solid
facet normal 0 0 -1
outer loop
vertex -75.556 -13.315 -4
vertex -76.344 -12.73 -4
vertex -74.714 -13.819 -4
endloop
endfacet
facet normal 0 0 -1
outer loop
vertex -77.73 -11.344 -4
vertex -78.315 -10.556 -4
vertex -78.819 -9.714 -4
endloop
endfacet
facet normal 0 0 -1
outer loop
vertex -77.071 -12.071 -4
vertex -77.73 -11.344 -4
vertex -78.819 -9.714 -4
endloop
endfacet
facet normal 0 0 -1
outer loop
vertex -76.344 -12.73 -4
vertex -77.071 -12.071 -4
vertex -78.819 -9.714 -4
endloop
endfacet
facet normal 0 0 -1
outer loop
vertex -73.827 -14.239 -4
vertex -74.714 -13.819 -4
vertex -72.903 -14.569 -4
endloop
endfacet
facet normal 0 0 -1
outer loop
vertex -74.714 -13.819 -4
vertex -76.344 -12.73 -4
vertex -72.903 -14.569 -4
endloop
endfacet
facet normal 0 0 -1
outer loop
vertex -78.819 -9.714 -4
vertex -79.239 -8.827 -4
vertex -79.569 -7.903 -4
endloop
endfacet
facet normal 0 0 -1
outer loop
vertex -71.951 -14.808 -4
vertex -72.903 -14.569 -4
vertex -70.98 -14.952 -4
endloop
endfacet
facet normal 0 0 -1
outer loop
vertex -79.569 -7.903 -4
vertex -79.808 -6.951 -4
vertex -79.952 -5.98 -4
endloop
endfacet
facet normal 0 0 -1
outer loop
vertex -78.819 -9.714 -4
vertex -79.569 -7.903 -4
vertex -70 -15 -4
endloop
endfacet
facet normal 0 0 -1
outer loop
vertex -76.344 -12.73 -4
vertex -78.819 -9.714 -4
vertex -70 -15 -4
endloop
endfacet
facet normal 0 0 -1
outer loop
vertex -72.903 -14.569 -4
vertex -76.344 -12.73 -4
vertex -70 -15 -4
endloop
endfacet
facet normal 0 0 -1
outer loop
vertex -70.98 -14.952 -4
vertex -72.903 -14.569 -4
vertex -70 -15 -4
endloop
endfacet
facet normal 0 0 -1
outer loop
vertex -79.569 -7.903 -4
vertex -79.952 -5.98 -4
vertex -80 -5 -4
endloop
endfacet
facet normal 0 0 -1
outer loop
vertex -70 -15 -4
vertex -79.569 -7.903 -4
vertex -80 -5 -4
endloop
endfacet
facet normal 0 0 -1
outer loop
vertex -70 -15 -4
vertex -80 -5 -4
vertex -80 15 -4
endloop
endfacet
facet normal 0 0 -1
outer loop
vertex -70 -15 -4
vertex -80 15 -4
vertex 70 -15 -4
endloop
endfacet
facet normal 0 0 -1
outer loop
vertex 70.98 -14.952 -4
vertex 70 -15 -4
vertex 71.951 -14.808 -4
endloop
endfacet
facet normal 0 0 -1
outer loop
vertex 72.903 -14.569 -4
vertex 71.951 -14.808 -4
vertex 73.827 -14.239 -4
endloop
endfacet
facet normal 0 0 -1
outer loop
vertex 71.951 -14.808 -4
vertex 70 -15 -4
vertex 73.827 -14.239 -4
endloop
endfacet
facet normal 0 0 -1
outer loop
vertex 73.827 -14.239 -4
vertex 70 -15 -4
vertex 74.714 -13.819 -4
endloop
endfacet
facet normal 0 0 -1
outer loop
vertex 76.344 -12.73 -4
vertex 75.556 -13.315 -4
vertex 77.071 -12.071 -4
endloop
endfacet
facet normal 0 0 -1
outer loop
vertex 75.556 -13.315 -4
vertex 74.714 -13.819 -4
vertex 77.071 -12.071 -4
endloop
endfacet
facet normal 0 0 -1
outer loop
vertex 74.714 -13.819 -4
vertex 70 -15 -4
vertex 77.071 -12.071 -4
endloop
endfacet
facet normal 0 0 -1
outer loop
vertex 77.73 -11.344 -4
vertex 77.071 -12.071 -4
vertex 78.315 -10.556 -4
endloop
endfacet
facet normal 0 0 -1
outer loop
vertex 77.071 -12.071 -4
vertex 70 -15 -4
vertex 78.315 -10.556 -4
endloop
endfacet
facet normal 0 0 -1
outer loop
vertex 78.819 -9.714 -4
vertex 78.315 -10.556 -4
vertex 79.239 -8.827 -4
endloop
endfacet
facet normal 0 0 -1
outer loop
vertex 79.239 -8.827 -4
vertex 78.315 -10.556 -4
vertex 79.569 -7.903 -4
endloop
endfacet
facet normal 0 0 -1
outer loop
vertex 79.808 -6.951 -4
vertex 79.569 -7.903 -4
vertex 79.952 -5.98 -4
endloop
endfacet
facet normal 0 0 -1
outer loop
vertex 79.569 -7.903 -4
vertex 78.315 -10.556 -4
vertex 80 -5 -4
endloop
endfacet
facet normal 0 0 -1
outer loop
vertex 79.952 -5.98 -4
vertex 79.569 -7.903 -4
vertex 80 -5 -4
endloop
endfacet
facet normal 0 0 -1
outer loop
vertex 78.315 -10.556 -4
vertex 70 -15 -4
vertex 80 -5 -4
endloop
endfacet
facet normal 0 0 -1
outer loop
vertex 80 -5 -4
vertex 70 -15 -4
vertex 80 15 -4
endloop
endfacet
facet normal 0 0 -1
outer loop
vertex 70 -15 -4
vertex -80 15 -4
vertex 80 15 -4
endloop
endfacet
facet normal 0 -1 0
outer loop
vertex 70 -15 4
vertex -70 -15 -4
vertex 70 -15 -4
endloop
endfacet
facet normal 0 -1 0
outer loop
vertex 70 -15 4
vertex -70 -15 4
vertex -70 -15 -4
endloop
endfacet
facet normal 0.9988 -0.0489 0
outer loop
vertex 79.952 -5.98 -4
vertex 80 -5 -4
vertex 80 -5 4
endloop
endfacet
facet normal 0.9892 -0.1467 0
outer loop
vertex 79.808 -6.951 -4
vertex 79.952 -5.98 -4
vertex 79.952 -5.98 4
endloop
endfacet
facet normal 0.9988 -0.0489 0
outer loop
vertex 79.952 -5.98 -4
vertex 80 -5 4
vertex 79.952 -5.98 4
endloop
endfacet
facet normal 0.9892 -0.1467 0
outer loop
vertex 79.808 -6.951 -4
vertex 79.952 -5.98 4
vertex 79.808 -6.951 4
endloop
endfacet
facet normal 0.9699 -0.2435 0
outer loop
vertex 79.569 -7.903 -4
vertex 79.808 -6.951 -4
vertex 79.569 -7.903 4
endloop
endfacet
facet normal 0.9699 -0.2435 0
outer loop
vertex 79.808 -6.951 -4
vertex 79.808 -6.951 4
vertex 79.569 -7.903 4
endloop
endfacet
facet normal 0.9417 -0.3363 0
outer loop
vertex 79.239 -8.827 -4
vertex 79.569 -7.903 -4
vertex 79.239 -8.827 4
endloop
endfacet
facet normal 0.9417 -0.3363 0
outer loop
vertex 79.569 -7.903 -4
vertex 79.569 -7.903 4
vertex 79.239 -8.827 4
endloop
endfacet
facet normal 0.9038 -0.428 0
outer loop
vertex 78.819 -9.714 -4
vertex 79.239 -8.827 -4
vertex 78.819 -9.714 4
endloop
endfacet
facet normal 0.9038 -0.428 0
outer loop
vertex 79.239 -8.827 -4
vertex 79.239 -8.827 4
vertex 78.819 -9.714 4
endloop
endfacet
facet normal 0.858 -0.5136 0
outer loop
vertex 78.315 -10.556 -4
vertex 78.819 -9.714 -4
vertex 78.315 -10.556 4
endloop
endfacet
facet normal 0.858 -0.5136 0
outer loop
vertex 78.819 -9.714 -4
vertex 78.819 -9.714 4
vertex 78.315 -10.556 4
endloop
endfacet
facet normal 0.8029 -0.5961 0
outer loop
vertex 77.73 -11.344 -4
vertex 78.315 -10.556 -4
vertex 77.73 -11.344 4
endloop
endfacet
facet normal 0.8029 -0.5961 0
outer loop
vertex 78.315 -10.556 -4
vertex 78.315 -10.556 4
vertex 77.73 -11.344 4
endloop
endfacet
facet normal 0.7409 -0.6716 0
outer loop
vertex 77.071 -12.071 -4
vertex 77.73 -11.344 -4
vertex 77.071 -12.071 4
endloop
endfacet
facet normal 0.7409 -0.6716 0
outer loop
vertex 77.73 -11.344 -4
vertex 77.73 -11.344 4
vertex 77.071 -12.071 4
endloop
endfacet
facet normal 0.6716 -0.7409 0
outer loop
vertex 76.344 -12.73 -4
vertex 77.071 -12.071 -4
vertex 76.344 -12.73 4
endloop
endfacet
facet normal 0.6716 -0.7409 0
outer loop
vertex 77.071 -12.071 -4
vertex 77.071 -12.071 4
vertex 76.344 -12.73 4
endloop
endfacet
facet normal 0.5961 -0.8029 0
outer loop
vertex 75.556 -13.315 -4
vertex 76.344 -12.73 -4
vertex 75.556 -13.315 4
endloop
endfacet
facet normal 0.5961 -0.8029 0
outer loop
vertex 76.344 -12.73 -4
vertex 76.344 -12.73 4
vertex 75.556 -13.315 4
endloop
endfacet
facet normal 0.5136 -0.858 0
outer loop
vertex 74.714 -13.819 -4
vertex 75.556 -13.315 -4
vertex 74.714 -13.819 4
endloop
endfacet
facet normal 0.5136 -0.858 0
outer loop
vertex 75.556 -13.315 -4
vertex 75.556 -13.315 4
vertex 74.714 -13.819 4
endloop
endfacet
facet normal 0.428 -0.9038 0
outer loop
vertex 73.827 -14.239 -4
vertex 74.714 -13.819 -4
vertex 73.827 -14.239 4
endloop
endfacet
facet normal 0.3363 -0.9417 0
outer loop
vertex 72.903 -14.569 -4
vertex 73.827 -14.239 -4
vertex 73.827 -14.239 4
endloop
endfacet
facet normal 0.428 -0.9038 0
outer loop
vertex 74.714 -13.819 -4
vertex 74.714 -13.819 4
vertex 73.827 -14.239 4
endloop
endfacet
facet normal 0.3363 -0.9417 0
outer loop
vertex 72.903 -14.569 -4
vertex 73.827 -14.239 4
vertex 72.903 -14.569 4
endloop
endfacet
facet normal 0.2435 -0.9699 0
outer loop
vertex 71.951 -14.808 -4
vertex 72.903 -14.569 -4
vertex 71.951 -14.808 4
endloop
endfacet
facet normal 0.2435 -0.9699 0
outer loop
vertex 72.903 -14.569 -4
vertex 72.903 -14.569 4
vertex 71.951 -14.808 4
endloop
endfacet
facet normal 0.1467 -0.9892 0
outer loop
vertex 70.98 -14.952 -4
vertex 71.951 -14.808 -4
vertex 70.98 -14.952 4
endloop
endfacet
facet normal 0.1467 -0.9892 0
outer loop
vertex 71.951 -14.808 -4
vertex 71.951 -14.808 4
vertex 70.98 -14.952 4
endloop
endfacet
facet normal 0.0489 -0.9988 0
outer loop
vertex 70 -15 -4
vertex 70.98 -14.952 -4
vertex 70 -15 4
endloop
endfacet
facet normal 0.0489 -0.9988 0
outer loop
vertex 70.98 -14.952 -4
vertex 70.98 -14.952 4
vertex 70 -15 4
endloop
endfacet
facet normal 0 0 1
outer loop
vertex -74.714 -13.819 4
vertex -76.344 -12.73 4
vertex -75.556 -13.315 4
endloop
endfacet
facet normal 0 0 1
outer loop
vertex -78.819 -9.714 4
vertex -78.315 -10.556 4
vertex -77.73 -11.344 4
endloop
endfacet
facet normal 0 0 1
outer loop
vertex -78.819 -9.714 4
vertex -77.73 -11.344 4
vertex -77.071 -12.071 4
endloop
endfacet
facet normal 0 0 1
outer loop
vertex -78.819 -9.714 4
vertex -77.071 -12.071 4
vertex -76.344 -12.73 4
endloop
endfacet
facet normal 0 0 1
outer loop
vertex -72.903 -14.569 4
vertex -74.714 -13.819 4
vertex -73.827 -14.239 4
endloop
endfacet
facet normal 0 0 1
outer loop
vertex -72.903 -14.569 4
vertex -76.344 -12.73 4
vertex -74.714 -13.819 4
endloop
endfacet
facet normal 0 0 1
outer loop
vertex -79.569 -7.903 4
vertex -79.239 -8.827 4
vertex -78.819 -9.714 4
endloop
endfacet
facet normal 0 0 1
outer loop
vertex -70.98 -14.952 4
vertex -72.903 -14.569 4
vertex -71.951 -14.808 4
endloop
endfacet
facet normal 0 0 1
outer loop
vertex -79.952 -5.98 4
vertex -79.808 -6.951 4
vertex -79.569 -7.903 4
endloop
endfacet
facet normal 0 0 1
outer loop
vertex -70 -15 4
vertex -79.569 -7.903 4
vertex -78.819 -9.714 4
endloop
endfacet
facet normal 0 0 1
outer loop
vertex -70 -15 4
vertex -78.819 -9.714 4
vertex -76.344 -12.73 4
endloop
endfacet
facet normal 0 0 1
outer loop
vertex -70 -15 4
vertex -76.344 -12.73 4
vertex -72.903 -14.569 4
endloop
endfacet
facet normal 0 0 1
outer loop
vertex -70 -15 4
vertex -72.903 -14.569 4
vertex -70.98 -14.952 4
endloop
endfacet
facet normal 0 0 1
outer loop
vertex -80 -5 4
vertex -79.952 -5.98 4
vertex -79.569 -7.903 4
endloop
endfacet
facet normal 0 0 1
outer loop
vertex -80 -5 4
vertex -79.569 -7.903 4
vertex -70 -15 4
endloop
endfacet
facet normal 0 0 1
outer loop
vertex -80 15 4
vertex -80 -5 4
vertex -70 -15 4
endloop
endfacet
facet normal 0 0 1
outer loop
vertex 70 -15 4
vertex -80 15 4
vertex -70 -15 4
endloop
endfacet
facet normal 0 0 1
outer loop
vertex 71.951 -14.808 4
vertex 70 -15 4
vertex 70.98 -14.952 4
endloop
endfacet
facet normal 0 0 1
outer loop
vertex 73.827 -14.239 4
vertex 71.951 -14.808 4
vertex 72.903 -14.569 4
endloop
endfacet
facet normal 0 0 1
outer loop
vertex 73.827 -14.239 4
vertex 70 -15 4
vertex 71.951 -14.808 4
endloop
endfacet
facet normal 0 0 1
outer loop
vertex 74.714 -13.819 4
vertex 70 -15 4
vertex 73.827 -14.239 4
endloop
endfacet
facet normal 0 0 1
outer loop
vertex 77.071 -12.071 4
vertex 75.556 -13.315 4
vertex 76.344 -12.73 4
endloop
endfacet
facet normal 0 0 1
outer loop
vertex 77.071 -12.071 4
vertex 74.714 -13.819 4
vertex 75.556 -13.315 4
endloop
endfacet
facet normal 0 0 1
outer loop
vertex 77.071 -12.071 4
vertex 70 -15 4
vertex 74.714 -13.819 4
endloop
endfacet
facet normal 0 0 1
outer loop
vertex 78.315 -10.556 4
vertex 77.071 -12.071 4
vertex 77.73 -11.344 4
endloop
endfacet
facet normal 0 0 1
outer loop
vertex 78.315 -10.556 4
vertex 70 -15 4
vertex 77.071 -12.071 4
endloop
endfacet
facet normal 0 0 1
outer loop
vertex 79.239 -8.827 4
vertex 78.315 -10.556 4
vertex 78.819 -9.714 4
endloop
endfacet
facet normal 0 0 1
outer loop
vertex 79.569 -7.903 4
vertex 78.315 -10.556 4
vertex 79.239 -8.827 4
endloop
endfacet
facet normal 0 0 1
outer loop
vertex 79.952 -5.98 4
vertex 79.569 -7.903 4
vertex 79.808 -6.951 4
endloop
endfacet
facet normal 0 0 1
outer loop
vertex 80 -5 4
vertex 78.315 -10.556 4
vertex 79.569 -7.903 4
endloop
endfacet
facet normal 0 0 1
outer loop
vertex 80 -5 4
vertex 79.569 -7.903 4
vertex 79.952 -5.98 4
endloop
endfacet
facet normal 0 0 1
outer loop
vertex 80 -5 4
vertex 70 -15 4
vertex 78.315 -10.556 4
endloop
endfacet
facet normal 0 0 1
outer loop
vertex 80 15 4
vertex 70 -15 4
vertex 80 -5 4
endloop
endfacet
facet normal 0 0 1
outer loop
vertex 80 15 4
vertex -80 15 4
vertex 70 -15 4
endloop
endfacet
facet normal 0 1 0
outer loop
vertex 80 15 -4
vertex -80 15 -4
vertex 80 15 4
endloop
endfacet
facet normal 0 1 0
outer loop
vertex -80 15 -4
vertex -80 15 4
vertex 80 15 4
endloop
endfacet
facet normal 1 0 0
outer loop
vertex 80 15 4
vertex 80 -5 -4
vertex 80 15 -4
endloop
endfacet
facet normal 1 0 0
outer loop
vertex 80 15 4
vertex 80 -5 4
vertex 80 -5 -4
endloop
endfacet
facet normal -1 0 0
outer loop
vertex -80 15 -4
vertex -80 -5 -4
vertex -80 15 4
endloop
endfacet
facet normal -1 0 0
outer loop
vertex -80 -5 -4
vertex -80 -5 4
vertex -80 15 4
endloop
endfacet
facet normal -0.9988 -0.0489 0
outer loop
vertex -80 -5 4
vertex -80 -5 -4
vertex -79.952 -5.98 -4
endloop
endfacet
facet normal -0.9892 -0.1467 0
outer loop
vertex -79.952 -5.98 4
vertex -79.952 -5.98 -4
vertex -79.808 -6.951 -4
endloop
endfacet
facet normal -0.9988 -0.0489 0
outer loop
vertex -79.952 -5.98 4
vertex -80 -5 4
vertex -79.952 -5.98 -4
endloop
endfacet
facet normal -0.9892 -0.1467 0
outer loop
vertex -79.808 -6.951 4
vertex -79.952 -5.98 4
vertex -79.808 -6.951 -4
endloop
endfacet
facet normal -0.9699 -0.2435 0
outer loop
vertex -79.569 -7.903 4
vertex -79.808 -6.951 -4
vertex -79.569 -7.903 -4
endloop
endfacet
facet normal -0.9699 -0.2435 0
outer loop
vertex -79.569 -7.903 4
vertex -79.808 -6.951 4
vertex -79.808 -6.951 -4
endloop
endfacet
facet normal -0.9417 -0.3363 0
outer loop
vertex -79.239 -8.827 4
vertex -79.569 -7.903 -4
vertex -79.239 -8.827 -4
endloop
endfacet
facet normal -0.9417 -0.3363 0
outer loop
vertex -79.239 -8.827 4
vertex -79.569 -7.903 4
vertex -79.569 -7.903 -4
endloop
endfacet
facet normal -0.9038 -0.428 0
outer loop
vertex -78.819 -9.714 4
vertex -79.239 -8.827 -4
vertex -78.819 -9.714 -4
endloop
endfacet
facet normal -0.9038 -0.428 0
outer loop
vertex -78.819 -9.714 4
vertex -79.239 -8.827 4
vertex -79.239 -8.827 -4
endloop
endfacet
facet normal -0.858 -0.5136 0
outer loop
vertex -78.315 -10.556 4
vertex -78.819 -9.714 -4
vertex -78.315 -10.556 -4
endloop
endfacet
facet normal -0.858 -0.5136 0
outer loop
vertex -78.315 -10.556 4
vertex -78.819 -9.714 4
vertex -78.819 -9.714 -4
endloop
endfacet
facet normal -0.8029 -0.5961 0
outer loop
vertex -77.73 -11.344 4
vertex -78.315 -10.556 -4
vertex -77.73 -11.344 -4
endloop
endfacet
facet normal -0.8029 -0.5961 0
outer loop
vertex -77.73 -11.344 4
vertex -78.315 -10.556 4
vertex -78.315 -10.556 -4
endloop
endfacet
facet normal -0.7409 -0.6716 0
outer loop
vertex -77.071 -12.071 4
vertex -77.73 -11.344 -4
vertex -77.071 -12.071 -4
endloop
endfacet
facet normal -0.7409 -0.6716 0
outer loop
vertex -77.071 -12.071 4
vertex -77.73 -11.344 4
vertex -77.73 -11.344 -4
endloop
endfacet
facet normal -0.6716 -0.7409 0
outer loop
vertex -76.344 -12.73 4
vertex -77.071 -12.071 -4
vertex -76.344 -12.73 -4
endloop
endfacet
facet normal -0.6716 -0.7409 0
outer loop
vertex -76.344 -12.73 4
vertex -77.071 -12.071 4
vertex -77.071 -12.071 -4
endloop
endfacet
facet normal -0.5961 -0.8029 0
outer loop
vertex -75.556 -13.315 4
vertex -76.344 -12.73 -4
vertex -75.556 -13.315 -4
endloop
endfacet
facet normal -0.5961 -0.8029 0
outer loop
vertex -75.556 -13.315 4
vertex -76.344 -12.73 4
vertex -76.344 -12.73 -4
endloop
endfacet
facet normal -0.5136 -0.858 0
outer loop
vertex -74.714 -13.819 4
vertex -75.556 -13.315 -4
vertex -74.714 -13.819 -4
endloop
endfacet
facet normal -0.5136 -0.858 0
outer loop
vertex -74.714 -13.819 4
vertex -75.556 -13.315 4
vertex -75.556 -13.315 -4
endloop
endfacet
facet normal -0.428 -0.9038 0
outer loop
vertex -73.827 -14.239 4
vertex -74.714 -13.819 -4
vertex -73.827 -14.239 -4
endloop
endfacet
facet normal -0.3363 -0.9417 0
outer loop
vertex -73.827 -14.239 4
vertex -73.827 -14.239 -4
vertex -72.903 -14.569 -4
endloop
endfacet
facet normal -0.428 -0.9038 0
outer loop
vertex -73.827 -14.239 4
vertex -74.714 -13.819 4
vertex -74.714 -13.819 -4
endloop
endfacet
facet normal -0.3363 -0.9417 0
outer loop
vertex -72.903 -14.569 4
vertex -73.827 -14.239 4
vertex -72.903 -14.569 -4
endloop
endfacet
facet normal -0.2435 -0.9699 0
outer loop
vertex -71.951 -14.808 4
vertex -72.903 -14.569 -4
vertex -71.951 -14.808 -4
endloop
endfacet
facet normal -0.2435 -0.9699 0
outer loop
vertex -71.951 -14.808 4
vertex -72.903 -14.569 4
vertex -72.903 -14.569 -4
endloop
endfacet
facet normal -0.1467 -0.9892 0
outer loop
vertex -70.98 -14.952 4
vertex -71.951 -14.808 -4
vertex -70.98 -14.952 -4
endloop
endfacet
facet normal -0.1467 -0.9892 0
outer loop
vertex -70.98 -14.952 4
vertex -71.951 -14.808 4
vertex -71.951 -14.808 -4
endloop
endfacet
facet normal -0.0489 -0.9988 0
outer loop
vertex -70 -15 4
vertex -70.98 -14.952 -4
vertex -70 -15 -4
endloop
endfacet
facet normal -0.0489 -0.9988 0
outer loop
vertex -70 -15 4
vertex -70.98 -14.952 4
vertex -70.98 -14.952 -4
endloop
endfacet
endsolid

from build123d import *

# Parameters (mm, degrees)
SKETCH1_W           = 160
SKETCH1_H           = 30
BOSS_EXTRUDE1_DEPTH = 4
FILLET1_R           = 10


with BuildPart() as part:
    # Sketch1 → Boss-Extrude1 (new, symmetric)
    with BuildSketch(Plane.XY):
        Rectangle(SKETCH1_W, SKETCH1_H)
    extrude(amount=BOSS_EXTRUDE1_DEPTH, both=True)

    # Fillet1
    fillet1_edges = [part.edges().sort_by_distance(p)[0] for p in [
        (80, -15, 0),
        (-80, -15, 0),
    ]]
    fillet(fillet1_edges, radius=FILLET1_R)


solid = part.part
